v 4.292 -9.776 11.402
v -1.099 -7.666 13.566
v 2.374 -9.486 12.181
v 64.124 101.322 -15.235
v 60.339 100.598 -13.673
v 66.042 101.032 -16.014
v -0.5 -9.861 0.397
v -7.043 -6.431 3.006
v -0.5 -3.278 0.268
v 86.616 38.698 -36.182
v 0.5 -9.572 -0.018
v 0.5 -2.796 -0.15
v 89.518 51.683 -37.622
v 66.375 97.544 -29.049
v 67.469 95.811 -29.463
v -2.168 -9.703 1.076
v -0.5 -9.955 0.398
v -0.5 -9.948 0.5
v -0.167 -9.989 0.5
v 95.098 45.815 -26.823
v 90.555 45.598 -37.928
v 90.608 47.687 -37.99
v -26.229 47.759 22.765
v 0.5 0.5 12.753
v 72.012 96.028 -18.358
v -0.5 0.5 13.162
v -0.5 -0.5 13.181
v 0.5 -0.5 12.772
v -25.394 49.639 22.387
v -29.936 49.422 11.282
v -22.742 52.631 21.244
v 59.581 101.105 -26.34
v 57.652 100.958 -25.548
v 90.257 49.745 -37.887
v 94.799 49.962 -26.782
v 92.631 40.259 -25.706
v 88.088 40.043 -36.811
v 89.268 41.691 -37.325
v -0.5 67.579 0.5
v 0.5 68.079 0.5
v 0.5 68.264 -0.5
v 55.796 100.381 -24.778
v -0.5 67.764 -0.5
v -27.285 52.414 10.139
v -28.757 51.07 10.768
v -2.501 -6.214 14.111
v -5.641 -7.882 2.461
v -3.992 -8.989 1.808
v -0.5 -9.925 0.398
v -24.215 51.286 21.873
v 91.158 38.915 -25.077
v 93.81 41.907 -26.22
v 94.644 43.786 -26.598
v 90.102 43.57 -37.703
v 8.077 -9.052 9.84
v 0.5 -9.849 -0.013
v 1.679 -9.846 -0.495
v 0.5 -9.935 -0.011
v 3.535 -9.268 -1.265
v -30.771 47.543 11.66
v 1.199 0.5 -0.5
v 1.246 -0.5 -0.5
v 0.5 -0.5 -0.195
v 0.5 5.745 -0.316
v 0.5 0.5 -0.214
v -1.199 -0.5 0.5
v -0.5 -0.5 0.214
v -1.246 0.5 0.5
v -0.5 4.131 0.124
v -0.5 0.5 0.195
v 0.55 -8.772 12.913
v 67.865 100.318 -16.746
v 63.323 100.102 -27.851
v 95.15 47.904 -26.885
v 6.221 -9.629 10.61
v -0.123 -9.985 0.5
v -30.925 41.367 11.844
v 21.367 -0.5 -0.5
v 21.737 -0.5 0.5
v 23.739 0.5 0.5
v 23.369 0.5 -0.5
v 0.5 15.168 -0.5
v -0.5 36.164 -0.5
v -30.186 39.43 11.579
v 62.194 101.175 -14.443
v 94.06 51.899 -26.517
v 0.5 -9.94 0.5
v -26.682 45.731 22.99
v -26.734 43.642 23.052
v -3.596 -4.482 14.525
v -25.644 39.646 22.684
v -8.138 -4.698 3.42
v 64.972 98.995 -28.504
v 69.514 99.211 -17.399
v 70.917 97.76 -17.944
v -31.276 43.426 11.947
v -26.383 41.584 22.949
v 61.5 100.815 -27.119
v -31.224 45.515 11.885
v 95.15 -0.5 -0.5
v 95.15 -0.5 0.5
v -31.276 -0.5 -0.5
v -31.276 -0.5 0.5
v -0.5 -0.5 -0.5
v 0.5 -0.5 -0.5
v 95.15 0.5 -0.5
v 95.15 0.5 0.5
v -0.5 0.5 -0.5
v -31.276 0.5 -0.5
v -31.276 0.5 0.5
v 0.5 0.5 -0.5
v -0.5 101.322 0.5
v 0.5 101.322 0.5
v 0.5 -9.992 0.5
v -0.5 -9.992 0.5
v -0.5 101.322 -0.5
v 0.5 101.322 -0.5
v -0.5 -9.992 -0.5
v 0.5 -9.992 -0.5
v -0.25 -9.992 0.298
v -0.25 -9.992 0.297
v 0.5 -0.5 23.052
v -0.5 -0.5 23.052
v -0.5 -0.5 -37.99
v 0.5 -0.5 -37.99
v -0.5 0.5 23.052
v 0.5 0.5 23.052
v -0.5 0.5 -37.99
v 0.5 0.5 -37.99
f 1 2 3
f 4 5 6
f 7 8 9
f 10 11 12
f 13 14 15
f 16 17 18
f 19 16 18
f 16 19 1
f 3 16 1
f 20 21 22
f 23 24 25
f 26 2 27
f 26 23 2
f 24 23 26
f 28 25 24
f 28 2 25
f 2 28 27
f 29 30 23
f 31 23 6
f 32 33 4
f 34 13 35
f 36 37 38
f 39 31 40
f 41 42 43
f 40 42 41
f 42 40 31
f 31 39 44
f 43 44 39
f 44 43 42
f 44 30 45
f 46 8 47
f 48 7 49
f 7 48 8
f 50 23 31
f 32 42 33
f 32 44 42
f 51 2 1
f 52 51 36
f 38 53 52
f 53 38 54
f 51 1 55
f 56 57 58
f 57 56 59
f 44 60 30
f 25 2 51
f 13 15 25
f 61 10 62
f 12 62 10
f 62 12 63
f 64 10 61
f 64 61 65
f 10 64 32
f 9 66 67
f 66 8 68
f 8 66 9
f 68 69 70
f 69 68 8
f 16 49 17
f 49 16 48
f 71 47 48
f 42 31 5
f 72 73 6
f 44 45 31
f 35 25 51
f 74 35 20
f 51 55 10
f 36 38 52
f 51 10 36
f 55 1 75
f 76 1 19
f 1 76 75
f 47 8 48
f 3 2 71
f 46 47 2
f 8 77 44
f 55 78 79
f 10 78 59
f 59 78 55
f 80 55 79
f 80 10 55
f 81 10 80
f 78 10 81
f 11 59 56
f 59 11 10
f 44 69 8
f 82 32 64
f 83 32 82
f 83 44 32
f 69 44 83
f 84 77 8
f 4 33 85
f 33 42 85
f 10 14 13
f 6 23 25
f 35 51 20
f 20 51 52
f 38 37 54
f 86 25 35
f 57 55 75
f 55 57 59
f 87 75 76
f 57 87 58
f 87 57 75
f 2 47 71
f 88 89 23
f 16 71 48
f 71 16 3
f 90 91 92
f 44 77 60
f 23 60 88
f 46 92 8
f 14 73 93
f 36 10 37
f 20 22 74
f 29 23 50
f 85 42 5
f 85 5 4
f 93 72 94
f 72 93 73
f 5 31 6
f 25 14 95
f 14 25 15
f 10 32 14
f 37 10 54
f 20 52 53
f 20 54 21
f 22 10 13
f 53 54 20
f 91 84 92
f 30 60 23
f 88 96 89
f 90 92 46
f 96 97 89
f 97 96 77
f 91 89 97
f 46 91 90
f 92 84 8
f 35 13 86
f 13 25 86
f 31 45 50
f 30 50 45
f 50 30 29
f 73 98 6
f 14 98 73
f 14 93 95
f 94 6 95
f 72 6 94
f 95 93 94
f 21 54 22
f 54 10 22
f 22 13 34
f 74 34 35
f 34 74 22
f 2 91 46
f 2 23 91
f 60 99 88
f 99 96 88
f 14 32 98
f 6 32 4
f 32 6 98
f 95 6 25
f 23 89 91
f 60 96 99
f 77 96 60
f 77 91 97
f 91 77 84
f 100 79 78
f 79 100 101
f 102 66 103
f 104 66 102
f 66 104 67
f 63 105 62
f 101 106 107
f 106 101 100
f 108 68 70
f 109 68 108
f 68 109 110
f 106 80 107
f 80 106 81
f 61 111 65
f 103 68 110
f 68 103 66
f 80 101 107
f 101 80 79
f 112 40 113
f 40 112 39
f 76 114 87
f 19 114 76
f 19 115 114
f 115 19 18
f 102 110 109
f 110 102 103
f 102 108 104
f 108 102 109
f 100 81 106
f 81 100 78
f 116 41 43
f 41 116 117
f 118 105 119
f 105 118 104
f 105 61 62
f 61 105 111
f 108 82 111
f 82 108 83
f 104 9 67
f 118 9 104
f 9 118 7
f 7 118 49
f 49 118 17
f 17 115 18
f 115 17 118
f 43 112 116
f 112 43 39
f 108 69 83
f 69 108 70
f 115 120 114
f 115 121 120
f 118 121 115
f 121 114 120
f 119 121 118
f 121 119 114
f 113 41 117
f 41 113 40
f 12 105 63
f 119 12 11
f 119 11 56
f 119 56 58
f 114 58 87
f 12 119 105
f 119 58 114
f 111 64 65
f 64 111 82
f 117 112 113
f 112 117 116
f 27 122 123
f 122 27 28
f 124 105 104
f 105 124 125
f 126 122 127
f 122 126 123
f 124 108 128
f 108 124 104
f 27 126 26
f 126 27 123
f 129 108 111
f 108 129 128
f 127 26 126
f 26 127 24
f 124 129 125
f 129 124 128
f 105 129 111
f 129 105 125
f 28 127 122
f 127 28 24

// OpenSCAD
e=.0001;

module get_x_axis(y, z)
{
	rotate([-90,0,0])
	linear_extrude(z, center=true)
	projection()
	rotate([90,0,0])
	linear_extrude(y, center=true)
	hull()
	projection()
	children();
}

module get_y_axis(z, x)
{
	rotate([0,0,-90])
	get_x_axis(z, x)
	rotate([0,0,90])
	children();
}

module get_z_axis(x, y)
{
	rotate([0,-90,0])
	get_x_axis(x, y)
	rotate([0,90,0])
	children();
}

module bbox(margin=0)
{
	m = max(e,margin);

	minkowski()
	{
		get_x_axis(m, m)
		children();

		get_y_axis(m, m)
		children();

		get_z_axis(m, m)
		children();
	}
}

module _test_bbox()
{
	children();

	color("red")
	get_x_axis(1, 1)
	children();

	color("green")
	get_y_axis(1, 1)
	children();

	color("blue")
	get_z_axis(1, 1)
	children();

	%bbox() children();
}

_test_bbox()
{
	rotate([10,20,30])
    hull()
	for (x = [0,100])
	for (y = [0,50])
	translate([x, y,0])
    cylinder(12, r=10);
}
